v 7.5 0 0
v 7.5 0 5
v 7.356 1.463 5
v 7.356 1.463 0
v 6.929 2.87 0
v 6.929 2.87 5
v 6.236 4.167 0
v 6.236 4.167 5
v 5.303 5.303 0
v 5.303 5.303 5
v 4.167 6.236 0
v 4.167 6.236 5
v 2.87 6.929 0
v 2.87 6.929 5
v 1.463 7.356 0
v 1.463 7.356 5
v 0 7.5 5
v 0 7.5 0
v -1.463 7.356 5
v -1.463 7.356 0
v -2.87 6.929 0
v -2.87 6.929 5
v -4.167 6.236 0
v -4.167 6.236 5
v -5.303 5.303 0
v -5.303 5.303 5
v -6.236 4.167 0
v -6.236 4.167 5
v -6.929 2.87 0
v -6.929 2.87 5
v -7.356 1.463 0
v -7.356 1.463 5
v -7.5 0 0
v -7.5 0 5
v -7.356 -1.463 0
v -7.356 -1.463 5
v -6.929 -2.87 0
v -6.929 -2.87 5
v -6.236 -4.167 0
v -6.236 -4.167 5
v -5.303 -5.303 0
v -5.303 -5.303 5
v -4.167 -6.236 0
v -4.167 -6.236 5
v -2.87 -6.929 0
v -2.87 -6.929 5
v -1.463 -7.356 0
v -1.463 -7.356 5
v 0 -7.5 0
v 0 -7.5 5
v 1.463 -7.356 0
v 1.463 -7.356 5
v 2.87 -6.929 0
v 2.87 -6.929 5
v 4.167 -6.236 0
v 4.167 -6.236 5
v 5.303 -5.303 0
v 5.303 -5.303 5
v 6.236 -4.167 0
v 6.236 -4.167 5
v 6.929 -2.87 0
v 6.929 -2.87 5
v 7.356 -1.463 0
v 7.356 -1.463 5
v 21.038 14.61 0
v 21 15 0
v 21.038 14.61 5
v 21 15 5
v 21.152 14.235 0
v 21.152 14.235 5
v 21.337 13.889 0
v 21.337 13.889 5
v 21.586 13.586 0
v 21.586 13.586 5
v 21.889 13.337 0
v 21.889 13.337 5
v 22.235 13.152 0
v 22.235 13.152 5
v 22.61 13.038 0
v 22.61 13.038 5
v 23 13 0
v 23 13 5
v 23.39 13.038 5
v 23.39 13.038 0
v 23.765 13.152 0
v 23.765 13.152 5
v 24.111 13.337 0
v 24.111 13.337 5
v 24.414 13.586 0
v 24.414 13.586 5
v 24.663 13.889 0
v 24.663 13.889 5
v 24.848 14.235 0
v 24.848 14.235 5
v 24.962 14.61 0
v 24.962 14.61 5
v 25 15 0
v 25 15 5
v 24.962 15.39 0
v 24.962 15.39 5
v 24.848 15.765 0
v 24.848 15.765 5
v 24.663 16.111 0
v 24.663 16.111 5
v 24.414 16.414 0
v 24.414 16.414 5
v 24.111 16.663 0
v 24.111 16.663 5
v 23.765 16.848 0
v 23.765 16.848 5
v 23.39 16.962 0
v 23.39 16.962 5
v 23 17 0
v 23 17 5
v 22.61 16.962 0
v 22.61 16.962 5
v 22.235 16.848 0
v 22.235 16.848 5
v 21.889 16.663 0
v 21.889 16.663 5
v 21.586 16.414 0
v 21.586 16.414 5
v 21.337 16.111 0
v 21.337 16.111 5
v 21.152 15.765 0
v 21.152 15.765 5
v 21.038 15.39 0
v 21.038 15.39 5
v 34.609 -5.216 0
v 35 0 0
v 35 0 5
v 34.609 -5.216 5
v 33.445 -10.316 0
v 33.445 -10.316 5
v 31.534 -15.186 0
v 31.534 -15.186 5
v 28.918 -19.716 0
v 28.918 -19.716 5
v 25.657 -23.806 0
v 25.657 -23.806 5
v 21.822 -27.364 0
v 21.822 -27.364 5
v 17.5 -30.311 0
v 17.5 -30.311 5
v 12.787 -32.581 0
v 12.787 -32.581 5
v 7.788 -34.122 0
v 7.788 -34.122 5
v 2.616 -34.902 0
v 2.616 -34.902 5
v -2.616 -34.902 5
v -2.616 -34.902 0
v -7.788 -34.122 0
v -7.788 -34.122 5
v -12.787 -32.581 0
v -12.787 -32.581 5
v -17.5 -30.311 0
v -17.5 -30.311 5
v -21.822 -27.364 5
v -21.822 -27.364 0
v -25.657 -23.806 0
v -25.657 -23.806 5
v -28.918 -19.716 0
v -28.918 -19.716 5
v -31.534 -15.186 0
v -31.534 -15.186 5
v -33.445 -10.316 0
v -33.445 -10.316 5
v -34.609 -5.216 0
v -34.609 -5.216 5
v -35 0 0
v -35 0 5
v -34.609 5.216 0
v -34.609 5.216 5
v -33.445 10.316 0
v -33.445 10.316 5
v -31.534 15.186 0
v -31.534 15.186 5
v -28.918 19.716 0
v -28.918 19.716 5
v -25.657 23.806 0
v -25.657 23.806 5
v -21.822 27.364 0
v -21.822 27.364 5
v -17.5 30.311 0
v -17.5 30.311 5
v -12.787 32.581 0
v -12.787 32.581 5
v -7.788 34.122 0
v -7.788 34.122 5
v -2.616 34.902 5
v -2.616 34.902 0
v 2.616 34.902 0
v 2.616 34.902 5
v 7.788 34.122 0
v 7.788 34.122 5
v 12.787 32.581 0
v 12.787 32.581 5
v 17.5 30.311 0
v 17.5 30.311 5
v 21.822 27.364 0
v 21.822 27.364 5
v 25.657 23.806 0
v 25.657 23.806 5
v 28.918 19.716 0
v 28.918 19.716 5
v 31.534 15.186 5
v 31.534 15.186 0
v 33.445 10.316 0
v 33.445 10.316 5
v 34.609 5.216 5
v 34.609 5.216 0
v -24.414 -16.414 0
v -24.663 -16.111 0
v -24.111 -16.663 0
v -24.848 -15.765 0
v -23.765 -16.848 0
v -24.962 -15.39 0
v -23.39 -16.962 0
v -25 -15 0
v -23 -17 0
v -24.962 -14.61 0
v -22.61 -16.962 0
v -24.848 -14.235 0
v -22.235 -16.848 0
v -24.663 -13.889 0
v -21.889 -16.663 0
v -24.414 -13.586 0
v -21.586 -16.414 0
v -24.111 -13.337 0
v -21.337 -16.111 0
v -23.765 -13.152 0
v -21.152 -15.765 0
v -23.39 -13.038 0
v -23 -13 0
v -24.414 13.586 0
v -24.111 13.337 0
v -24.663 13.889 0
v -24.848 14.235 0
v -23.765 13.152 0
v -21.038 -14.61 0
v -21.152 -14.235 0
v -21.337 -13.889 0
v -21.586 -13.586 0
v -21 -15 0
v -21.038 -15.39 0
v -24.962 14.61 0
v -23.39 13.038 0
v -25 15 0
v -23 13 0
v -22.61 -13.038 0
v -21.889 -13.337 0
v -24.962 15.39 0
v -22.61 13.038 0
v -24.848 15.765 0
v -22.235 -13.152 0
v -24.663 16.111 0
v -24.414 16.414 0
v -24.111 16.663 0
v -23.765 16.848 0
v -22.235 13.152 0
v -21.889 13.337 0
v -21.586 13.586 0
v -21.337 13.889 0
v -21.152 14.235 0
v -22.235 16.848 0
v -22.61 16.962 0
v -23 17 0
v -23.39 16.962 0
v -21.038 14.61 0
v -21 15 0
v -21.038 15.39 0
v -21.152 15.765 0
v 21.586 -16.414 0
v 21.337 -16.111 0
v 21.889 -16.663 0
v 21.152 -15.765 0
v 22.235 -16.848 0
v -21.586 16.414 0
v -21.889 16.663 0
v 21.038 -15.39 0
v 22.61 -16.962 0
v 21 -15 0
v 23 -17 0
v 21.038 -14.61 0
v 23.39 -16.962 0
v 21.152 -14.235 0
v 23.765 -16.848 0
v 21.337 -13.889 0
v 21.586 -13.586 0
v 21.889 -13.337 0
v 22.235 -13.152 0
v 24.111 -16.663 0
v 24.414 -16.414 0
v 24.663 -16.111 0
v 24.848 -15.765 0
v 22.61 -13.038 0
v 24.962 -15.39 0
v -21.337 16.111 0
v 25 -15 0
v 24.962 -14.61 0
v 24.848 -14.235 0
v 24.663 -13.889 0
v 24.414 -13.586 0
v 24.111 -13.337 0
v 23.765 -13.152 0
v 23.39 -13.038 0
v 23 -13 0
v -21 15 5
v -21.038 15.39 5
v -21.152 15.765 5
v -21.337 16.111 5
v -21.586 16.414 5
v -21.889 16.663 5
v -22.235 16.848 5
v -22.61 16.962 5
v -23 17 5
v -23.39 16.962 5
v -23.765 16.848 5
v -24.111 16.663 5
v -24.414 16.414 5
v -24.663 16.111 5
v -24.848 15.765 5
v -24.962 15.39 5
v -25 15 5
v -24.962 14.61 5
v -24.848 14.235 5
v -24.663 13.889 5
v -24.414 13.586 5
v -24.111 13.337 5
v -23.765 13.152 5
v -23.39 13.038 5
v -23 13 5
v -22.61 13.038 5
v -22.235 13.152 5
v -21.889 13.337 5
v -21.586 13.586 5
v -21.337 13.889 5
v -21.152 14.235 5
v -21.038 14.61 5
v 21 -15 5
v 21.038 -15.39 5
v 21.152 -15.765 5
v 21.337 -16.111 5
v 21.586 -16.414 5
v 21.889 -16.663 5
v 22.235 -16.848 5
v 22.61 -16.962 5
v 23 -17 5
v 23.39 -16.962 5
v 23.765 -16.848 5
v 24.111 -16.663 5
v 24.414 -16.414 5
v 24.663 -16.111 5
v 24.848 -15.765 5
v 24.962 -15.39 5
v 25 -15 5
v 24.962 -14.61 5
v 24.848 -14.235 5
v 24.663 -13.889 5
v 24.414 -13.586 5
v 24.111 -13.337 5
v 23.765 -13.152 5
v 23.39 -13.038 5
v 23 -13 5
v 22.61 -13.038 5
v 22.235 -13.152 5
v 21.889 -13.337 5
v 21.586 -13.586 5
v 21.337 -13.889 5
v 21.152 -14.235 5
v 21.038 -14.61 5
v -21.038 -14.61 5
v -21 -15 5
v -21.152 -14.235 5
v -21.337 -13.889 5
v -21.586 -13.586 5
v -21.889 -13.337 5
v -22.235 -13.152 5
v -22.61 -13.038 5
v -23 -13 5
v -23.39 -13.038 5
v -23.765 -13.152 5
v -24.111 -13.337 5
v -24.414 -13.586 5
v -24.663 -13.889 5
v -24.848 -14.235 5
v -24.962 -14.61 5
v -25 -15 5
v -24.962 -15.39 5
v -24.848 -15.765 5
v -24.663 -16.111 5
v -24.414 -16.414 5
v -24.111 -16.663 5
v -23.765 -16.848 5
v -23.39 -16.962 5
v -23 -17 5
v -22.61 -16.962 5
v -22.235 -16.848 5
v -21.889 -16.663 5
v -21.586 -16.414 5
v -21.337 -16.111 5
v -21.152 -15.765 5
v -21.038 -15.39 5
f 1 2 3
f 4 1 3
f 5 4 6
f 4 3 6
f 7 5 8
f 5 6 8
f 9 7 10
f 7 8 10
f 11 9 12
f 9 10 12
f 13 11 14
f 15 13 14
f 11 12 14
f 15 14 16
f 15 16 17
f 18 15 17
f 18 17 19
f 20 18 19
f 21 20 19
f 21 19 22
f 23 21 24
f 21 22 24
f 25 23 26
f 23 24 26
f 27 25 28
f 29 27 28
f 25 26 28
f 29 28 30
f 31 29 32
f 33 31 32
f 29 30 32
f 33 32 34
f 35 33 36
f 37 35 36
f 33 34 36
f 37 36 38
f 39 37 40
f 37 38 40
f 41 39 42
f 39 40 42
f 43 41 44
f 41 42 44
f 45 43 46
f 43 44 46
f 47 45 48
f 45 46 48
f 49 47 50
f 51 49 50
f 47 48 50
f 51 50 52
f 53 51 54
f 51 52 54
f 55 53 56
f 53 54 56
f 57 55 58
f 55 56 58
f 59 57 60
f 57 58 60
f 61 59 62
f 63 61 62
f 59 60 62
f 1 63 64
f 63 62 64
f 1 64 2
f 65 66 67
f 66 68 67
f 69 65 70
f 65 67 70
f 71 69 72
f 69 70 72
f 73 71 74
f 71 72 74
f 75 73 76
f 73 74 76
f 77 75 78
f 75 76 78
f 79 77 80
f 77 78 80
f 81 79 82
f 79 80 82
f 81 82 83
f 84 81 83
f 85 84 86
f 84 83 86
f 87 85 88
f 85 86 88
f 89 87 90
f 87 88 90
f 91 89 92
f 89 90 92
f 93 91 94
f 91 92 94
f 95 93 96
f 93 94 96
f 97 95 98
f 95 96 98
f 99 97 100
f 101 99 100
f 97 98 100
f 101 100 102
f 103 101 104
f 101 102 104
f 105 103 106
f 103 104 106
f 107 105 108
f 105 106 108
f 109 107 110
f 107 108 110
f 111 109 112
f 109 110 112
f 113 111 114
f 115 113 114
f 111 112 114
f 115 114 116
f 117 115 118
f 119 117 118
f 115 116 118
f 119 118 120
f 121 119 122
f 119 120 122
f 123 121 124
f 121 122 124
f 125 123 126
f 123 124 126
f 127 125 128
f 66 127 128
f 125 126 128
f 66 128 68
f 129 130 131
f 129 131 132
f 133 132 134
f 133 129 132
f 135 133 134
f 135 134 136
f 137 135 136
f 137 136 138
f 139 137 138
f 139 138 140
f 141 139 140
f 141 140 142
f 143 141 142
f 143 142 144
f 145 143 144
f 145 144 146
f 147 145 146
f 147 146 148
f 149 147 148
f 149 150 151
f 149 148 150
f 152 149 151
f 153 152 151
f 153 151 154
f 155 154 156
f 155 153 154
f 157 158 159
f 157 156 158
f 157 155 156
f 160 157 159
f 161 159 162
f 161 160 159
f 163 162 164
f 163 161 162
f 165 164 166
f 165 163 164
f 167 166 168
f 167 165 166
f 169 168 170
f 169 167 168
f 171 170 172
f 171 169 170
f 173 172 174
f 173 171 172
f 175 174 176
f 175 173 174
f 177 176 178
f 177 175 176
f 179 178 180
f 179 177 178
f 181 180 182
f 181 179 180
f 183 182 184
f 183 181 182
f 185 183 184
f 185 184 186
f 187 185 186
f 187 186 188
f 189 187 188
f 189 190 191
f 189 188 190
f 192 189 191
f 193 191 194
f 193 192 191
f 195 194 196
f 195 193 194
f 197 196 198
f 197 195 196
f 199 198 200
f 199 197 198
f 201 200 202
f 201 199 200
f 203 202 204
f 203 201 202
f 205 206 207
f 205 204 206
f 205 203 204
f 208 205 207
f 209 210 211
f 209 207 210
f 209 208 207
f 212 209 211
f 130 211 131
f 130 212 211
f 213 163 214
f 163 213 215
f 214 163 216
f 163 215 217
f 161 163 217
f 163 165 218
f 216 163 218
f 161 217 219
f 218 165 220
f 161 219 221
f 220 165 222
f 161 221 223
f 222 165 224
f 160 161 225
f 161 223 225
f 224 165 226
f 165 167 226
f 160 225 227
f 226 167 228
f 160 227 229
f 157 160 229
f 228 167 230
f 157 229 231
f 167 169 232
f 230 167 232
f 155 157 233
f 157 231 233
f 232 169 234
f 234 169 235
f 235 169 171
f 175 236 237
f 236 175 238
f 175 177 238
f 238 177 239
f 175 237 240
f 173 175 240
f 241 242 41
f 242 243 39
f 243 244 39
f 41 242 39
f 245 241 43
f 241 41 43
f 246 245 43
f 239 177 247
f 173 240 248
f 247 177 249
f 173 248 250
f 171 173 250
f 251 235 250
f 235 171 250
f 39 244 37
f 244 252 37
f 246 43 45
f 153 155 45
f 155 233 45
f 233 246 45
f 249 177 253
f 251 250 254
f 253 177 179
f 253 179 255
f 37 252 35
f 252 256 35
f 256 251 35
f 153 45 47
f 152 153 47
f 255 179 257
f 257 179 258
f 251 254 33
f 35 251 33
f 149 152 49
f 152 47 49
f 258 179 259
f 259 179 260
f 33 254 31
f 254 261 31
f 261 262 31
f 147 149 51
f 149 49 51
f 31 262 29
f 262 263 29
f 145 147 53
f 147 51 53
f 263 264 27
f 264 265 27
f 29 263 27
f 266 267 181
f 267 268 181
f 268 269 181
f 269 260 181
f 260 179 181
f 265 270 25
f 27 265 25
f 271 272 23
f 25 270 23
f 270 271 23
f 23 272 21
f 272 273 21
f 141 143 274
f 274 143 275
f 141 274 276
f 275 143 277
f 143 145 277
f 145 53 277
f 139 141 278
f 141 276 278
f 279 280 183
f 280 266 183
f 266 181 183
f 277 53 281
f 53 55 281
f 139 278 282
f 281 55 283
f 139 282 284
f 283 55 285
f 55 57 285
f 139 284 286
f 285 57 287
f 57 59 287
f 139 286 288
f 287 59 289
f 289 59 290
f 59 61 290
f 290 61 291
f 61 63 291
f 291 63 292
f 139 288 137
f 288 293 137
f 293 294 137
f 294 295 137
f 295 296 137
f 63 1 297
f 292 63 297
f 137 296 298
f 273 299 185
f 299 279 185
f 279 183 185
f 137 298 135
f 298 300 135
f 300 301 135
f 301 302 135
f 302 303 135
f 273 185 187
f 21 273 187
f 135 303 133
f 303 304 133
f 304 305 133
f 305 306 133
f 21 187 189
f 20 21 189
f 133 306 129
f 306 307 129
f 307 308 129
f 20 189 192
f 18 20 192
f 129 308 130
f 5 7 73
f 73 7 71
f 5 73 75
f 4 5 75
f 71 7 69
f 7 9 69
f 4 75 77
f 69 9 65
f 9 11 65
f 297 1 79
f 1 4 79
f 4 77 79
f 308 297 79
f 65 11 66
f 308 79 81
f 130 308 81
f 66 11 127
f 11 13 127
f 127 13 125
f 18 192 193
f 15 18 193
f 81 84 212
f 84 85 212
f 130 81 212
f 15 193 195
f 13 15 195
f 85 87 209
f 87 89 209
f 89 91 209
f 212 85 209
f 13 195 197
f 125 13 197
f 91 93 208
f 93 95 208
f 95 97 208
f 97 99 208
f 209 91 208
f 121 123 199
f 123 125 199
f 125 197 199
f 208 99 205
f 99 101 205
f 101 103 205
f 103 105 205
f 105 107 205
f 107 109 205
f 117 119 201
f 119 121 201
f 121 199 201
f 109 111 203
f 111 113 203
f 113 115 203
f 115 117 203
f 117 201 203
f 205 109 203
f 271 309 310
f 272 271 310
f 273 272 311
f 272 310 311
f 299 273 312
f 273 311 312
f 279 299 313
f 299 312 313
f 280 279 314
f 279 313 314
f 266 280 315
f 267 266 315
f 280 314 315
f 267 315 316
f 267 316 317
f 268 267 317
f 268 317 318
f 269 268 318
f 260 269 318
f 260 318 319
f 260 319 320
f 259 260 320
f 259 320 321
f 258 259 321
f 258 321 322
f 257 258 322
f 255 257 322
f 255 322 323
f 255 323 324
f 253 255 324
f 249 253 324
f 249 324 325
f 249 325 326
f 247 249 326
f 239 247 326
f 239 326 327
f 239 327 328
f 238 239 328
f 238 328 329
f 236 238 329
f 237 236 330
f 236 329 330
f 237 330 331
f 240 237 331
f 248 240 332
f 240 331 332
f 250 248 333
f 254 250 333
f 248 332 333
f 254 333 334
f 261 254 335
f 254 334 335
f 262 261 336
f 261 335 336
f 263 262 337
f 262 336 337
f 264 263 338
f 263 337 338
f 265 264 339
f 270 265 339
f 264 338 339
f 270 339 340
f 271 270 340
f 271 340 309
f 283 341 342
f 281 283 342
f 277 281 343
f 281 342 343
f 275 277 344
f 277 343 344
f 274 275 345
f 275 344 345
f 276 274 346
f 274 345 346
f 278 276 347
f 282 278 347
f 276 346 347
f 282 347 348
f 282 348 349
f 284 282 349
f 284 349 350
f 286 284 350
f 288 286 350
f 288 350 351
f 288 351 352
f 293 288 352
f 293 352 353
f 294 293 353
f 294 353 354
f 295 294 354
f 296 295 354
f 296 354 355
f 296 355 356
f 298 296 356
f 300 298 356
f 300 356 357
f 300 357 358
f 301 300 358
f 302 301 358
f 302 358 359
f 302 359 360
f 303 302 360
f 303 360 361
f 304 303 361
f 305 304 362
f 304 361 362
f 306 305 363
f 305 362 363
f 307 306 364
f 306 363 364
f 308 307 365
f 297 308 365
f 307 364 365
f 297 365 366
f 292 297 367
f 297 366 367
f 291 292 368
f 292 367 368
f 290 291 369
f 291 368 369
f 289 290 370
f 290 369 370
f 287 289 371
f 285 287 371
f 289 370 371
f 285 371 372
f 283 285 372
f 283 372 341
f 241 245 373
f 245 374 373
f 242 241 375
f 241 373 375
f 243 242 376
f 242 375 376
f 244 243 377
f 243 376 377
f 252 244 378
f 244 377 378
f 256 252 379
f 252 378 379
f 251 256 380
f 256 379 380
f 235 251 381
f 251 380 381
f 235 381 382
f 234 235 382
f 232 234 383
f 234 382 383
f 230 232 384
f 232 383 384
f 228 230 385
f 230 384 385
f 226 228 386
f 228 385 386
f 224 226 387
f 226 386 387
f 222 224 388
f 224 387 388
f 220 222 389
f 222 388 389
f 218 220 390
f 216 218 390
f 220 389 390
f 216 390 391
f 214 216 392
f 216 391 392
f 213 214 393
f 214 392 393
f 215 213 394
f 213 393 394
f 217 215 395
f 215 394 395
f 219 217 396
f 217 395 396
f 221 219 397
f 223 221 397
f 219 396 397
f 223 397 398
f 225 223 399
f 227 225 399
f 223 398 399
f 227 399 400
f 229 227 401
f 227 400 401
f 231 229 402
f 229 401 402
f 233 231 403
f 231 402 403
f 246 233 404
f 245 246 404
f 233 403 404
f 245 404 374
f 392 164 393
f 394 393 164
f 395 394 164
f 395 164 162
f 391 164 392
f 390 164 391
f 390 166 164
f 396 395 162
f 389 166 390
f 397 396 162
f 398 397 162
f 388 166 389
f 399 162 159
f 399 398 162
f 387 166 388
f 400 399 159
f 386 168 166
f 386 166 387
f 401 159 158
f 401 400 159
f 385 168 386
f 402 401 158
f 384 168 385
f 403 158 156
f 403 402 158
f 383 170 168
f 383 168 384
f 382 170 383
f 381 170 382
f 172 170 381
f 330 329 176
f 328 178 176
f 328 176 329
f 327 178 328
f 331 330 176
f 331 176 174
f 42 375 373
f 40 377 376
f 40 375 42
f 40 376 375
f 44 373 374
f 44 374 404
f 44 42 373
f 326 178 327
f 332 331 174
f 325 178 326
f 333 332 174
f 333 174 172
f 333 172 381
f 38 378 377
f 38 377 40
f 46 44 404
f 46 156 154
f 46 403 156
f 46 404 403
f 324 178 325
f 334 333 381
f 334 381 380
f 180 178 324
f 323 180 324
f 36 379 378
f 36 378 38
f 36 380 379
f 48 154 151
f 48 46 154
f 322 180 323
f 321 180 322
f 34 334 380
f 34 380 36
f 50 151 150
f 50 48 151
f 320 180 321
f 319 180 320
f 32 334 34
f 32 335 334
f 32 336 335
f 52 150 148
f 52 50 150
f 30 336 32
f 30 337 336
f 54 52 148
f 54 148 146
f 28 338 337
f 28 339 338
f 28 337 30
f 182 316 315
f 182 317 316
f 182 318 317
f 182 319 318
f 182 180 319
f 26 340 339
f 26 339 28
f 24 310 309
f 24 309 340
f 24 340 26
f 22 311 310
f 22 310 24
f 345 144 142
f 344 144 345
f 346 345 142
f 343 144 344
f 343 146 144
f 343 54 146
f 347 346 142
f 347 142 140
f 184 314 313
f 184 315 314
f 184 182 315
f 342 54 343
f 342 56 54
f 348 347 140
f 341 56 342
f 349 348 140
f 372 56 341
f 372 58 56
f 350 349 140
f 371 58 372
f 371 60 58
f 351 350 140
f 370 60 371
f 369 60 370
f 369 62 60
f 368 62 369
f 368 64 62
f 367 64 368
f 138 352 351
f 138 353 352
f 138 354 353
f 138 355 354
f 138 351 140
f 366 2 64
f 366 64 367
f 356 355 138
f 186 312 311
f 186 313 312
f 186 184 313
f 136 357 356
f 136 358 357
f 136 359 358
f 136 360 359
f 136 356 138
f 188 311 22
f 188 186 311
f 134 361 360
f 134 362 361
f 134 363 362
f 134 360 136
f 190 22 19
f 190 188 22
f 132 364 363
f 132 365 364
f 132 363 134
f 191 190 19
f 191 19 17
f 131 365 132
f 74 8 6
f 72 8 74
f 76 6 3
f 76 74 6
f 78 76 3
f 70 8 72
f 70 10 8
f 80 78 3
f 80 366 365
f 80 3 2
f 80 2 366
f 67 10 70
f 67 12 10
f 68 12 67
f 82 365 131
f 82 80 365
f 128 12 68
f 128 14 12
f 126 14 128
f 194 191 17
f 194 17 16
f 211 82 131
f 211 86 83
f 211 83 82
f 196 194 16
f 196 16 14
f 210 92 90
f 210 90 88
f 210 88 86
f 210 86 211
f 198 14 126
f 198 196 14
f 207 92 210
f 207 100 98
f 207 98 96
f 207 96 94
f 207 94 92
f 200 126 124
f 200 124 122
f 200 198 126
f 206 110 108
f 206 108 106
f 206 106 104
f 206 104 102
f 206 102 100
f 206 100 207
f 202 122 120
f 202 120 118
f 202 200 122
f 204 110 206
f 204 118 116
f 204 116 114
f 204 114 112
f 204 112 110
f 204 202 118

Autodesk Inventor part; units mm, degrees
ref_plane "YZ Plane" through (0, 0, 0) normal (1, 0, 0) x (0, 1, 0)
ref_plane "XZ Plane" through (0, 0, 0) normal (0, 1, 0) x (-1, 0, 0)
ref_plane "XY Plane" through (0, 0, 0) normal (0, 0, 1) x (1, 0, 0)
sketch "Эскиз1" plane through (0, 0, 0) normal (0, 0, 1) x (1, 0, 0)
  circle A0 centre (0, 0) radius 35
  dimension "d7" = 70
extrude "Выдавливание1" add sketch "Эскиз1" along normal blind 5
sketch "Эскиз2" plane through (0, 0, 5) normal (0, 0, 1) x (1, 0, 0)
  circle A0 centre (-23, 15) radius 2
  point P0 (0, 0)
  dimension "d4" = 4
  dimension "d5" = 15
  dimension "d6" = 23
extrude "Выдавливание2" cut sketch "Эскиз2" against normal through all
mirror "Зеркальное отражение1" about plane through (0, 0, 0) normal (0, 1, 0) of "Выдавливание2"
mirror "Зеркальное отражение2" about plane through (0, 0, 0) normal (1, 0, 0) of "Выдавливание2", "Зеркальное отражение1"
sketch "Эскиз19" plane through (0, 0, 5) normal (0, 0, 1) x (1, 0, 0)
  circle A0 centre (0, 0) radius 7.5
  dimension "d75" = 15
extrude "Выдавливание18" cut sketch "Эскиз19" against normal through all
properties part number "000.005.005.001 - ОСНОВАНИЕ" material "Пластик АБС"
